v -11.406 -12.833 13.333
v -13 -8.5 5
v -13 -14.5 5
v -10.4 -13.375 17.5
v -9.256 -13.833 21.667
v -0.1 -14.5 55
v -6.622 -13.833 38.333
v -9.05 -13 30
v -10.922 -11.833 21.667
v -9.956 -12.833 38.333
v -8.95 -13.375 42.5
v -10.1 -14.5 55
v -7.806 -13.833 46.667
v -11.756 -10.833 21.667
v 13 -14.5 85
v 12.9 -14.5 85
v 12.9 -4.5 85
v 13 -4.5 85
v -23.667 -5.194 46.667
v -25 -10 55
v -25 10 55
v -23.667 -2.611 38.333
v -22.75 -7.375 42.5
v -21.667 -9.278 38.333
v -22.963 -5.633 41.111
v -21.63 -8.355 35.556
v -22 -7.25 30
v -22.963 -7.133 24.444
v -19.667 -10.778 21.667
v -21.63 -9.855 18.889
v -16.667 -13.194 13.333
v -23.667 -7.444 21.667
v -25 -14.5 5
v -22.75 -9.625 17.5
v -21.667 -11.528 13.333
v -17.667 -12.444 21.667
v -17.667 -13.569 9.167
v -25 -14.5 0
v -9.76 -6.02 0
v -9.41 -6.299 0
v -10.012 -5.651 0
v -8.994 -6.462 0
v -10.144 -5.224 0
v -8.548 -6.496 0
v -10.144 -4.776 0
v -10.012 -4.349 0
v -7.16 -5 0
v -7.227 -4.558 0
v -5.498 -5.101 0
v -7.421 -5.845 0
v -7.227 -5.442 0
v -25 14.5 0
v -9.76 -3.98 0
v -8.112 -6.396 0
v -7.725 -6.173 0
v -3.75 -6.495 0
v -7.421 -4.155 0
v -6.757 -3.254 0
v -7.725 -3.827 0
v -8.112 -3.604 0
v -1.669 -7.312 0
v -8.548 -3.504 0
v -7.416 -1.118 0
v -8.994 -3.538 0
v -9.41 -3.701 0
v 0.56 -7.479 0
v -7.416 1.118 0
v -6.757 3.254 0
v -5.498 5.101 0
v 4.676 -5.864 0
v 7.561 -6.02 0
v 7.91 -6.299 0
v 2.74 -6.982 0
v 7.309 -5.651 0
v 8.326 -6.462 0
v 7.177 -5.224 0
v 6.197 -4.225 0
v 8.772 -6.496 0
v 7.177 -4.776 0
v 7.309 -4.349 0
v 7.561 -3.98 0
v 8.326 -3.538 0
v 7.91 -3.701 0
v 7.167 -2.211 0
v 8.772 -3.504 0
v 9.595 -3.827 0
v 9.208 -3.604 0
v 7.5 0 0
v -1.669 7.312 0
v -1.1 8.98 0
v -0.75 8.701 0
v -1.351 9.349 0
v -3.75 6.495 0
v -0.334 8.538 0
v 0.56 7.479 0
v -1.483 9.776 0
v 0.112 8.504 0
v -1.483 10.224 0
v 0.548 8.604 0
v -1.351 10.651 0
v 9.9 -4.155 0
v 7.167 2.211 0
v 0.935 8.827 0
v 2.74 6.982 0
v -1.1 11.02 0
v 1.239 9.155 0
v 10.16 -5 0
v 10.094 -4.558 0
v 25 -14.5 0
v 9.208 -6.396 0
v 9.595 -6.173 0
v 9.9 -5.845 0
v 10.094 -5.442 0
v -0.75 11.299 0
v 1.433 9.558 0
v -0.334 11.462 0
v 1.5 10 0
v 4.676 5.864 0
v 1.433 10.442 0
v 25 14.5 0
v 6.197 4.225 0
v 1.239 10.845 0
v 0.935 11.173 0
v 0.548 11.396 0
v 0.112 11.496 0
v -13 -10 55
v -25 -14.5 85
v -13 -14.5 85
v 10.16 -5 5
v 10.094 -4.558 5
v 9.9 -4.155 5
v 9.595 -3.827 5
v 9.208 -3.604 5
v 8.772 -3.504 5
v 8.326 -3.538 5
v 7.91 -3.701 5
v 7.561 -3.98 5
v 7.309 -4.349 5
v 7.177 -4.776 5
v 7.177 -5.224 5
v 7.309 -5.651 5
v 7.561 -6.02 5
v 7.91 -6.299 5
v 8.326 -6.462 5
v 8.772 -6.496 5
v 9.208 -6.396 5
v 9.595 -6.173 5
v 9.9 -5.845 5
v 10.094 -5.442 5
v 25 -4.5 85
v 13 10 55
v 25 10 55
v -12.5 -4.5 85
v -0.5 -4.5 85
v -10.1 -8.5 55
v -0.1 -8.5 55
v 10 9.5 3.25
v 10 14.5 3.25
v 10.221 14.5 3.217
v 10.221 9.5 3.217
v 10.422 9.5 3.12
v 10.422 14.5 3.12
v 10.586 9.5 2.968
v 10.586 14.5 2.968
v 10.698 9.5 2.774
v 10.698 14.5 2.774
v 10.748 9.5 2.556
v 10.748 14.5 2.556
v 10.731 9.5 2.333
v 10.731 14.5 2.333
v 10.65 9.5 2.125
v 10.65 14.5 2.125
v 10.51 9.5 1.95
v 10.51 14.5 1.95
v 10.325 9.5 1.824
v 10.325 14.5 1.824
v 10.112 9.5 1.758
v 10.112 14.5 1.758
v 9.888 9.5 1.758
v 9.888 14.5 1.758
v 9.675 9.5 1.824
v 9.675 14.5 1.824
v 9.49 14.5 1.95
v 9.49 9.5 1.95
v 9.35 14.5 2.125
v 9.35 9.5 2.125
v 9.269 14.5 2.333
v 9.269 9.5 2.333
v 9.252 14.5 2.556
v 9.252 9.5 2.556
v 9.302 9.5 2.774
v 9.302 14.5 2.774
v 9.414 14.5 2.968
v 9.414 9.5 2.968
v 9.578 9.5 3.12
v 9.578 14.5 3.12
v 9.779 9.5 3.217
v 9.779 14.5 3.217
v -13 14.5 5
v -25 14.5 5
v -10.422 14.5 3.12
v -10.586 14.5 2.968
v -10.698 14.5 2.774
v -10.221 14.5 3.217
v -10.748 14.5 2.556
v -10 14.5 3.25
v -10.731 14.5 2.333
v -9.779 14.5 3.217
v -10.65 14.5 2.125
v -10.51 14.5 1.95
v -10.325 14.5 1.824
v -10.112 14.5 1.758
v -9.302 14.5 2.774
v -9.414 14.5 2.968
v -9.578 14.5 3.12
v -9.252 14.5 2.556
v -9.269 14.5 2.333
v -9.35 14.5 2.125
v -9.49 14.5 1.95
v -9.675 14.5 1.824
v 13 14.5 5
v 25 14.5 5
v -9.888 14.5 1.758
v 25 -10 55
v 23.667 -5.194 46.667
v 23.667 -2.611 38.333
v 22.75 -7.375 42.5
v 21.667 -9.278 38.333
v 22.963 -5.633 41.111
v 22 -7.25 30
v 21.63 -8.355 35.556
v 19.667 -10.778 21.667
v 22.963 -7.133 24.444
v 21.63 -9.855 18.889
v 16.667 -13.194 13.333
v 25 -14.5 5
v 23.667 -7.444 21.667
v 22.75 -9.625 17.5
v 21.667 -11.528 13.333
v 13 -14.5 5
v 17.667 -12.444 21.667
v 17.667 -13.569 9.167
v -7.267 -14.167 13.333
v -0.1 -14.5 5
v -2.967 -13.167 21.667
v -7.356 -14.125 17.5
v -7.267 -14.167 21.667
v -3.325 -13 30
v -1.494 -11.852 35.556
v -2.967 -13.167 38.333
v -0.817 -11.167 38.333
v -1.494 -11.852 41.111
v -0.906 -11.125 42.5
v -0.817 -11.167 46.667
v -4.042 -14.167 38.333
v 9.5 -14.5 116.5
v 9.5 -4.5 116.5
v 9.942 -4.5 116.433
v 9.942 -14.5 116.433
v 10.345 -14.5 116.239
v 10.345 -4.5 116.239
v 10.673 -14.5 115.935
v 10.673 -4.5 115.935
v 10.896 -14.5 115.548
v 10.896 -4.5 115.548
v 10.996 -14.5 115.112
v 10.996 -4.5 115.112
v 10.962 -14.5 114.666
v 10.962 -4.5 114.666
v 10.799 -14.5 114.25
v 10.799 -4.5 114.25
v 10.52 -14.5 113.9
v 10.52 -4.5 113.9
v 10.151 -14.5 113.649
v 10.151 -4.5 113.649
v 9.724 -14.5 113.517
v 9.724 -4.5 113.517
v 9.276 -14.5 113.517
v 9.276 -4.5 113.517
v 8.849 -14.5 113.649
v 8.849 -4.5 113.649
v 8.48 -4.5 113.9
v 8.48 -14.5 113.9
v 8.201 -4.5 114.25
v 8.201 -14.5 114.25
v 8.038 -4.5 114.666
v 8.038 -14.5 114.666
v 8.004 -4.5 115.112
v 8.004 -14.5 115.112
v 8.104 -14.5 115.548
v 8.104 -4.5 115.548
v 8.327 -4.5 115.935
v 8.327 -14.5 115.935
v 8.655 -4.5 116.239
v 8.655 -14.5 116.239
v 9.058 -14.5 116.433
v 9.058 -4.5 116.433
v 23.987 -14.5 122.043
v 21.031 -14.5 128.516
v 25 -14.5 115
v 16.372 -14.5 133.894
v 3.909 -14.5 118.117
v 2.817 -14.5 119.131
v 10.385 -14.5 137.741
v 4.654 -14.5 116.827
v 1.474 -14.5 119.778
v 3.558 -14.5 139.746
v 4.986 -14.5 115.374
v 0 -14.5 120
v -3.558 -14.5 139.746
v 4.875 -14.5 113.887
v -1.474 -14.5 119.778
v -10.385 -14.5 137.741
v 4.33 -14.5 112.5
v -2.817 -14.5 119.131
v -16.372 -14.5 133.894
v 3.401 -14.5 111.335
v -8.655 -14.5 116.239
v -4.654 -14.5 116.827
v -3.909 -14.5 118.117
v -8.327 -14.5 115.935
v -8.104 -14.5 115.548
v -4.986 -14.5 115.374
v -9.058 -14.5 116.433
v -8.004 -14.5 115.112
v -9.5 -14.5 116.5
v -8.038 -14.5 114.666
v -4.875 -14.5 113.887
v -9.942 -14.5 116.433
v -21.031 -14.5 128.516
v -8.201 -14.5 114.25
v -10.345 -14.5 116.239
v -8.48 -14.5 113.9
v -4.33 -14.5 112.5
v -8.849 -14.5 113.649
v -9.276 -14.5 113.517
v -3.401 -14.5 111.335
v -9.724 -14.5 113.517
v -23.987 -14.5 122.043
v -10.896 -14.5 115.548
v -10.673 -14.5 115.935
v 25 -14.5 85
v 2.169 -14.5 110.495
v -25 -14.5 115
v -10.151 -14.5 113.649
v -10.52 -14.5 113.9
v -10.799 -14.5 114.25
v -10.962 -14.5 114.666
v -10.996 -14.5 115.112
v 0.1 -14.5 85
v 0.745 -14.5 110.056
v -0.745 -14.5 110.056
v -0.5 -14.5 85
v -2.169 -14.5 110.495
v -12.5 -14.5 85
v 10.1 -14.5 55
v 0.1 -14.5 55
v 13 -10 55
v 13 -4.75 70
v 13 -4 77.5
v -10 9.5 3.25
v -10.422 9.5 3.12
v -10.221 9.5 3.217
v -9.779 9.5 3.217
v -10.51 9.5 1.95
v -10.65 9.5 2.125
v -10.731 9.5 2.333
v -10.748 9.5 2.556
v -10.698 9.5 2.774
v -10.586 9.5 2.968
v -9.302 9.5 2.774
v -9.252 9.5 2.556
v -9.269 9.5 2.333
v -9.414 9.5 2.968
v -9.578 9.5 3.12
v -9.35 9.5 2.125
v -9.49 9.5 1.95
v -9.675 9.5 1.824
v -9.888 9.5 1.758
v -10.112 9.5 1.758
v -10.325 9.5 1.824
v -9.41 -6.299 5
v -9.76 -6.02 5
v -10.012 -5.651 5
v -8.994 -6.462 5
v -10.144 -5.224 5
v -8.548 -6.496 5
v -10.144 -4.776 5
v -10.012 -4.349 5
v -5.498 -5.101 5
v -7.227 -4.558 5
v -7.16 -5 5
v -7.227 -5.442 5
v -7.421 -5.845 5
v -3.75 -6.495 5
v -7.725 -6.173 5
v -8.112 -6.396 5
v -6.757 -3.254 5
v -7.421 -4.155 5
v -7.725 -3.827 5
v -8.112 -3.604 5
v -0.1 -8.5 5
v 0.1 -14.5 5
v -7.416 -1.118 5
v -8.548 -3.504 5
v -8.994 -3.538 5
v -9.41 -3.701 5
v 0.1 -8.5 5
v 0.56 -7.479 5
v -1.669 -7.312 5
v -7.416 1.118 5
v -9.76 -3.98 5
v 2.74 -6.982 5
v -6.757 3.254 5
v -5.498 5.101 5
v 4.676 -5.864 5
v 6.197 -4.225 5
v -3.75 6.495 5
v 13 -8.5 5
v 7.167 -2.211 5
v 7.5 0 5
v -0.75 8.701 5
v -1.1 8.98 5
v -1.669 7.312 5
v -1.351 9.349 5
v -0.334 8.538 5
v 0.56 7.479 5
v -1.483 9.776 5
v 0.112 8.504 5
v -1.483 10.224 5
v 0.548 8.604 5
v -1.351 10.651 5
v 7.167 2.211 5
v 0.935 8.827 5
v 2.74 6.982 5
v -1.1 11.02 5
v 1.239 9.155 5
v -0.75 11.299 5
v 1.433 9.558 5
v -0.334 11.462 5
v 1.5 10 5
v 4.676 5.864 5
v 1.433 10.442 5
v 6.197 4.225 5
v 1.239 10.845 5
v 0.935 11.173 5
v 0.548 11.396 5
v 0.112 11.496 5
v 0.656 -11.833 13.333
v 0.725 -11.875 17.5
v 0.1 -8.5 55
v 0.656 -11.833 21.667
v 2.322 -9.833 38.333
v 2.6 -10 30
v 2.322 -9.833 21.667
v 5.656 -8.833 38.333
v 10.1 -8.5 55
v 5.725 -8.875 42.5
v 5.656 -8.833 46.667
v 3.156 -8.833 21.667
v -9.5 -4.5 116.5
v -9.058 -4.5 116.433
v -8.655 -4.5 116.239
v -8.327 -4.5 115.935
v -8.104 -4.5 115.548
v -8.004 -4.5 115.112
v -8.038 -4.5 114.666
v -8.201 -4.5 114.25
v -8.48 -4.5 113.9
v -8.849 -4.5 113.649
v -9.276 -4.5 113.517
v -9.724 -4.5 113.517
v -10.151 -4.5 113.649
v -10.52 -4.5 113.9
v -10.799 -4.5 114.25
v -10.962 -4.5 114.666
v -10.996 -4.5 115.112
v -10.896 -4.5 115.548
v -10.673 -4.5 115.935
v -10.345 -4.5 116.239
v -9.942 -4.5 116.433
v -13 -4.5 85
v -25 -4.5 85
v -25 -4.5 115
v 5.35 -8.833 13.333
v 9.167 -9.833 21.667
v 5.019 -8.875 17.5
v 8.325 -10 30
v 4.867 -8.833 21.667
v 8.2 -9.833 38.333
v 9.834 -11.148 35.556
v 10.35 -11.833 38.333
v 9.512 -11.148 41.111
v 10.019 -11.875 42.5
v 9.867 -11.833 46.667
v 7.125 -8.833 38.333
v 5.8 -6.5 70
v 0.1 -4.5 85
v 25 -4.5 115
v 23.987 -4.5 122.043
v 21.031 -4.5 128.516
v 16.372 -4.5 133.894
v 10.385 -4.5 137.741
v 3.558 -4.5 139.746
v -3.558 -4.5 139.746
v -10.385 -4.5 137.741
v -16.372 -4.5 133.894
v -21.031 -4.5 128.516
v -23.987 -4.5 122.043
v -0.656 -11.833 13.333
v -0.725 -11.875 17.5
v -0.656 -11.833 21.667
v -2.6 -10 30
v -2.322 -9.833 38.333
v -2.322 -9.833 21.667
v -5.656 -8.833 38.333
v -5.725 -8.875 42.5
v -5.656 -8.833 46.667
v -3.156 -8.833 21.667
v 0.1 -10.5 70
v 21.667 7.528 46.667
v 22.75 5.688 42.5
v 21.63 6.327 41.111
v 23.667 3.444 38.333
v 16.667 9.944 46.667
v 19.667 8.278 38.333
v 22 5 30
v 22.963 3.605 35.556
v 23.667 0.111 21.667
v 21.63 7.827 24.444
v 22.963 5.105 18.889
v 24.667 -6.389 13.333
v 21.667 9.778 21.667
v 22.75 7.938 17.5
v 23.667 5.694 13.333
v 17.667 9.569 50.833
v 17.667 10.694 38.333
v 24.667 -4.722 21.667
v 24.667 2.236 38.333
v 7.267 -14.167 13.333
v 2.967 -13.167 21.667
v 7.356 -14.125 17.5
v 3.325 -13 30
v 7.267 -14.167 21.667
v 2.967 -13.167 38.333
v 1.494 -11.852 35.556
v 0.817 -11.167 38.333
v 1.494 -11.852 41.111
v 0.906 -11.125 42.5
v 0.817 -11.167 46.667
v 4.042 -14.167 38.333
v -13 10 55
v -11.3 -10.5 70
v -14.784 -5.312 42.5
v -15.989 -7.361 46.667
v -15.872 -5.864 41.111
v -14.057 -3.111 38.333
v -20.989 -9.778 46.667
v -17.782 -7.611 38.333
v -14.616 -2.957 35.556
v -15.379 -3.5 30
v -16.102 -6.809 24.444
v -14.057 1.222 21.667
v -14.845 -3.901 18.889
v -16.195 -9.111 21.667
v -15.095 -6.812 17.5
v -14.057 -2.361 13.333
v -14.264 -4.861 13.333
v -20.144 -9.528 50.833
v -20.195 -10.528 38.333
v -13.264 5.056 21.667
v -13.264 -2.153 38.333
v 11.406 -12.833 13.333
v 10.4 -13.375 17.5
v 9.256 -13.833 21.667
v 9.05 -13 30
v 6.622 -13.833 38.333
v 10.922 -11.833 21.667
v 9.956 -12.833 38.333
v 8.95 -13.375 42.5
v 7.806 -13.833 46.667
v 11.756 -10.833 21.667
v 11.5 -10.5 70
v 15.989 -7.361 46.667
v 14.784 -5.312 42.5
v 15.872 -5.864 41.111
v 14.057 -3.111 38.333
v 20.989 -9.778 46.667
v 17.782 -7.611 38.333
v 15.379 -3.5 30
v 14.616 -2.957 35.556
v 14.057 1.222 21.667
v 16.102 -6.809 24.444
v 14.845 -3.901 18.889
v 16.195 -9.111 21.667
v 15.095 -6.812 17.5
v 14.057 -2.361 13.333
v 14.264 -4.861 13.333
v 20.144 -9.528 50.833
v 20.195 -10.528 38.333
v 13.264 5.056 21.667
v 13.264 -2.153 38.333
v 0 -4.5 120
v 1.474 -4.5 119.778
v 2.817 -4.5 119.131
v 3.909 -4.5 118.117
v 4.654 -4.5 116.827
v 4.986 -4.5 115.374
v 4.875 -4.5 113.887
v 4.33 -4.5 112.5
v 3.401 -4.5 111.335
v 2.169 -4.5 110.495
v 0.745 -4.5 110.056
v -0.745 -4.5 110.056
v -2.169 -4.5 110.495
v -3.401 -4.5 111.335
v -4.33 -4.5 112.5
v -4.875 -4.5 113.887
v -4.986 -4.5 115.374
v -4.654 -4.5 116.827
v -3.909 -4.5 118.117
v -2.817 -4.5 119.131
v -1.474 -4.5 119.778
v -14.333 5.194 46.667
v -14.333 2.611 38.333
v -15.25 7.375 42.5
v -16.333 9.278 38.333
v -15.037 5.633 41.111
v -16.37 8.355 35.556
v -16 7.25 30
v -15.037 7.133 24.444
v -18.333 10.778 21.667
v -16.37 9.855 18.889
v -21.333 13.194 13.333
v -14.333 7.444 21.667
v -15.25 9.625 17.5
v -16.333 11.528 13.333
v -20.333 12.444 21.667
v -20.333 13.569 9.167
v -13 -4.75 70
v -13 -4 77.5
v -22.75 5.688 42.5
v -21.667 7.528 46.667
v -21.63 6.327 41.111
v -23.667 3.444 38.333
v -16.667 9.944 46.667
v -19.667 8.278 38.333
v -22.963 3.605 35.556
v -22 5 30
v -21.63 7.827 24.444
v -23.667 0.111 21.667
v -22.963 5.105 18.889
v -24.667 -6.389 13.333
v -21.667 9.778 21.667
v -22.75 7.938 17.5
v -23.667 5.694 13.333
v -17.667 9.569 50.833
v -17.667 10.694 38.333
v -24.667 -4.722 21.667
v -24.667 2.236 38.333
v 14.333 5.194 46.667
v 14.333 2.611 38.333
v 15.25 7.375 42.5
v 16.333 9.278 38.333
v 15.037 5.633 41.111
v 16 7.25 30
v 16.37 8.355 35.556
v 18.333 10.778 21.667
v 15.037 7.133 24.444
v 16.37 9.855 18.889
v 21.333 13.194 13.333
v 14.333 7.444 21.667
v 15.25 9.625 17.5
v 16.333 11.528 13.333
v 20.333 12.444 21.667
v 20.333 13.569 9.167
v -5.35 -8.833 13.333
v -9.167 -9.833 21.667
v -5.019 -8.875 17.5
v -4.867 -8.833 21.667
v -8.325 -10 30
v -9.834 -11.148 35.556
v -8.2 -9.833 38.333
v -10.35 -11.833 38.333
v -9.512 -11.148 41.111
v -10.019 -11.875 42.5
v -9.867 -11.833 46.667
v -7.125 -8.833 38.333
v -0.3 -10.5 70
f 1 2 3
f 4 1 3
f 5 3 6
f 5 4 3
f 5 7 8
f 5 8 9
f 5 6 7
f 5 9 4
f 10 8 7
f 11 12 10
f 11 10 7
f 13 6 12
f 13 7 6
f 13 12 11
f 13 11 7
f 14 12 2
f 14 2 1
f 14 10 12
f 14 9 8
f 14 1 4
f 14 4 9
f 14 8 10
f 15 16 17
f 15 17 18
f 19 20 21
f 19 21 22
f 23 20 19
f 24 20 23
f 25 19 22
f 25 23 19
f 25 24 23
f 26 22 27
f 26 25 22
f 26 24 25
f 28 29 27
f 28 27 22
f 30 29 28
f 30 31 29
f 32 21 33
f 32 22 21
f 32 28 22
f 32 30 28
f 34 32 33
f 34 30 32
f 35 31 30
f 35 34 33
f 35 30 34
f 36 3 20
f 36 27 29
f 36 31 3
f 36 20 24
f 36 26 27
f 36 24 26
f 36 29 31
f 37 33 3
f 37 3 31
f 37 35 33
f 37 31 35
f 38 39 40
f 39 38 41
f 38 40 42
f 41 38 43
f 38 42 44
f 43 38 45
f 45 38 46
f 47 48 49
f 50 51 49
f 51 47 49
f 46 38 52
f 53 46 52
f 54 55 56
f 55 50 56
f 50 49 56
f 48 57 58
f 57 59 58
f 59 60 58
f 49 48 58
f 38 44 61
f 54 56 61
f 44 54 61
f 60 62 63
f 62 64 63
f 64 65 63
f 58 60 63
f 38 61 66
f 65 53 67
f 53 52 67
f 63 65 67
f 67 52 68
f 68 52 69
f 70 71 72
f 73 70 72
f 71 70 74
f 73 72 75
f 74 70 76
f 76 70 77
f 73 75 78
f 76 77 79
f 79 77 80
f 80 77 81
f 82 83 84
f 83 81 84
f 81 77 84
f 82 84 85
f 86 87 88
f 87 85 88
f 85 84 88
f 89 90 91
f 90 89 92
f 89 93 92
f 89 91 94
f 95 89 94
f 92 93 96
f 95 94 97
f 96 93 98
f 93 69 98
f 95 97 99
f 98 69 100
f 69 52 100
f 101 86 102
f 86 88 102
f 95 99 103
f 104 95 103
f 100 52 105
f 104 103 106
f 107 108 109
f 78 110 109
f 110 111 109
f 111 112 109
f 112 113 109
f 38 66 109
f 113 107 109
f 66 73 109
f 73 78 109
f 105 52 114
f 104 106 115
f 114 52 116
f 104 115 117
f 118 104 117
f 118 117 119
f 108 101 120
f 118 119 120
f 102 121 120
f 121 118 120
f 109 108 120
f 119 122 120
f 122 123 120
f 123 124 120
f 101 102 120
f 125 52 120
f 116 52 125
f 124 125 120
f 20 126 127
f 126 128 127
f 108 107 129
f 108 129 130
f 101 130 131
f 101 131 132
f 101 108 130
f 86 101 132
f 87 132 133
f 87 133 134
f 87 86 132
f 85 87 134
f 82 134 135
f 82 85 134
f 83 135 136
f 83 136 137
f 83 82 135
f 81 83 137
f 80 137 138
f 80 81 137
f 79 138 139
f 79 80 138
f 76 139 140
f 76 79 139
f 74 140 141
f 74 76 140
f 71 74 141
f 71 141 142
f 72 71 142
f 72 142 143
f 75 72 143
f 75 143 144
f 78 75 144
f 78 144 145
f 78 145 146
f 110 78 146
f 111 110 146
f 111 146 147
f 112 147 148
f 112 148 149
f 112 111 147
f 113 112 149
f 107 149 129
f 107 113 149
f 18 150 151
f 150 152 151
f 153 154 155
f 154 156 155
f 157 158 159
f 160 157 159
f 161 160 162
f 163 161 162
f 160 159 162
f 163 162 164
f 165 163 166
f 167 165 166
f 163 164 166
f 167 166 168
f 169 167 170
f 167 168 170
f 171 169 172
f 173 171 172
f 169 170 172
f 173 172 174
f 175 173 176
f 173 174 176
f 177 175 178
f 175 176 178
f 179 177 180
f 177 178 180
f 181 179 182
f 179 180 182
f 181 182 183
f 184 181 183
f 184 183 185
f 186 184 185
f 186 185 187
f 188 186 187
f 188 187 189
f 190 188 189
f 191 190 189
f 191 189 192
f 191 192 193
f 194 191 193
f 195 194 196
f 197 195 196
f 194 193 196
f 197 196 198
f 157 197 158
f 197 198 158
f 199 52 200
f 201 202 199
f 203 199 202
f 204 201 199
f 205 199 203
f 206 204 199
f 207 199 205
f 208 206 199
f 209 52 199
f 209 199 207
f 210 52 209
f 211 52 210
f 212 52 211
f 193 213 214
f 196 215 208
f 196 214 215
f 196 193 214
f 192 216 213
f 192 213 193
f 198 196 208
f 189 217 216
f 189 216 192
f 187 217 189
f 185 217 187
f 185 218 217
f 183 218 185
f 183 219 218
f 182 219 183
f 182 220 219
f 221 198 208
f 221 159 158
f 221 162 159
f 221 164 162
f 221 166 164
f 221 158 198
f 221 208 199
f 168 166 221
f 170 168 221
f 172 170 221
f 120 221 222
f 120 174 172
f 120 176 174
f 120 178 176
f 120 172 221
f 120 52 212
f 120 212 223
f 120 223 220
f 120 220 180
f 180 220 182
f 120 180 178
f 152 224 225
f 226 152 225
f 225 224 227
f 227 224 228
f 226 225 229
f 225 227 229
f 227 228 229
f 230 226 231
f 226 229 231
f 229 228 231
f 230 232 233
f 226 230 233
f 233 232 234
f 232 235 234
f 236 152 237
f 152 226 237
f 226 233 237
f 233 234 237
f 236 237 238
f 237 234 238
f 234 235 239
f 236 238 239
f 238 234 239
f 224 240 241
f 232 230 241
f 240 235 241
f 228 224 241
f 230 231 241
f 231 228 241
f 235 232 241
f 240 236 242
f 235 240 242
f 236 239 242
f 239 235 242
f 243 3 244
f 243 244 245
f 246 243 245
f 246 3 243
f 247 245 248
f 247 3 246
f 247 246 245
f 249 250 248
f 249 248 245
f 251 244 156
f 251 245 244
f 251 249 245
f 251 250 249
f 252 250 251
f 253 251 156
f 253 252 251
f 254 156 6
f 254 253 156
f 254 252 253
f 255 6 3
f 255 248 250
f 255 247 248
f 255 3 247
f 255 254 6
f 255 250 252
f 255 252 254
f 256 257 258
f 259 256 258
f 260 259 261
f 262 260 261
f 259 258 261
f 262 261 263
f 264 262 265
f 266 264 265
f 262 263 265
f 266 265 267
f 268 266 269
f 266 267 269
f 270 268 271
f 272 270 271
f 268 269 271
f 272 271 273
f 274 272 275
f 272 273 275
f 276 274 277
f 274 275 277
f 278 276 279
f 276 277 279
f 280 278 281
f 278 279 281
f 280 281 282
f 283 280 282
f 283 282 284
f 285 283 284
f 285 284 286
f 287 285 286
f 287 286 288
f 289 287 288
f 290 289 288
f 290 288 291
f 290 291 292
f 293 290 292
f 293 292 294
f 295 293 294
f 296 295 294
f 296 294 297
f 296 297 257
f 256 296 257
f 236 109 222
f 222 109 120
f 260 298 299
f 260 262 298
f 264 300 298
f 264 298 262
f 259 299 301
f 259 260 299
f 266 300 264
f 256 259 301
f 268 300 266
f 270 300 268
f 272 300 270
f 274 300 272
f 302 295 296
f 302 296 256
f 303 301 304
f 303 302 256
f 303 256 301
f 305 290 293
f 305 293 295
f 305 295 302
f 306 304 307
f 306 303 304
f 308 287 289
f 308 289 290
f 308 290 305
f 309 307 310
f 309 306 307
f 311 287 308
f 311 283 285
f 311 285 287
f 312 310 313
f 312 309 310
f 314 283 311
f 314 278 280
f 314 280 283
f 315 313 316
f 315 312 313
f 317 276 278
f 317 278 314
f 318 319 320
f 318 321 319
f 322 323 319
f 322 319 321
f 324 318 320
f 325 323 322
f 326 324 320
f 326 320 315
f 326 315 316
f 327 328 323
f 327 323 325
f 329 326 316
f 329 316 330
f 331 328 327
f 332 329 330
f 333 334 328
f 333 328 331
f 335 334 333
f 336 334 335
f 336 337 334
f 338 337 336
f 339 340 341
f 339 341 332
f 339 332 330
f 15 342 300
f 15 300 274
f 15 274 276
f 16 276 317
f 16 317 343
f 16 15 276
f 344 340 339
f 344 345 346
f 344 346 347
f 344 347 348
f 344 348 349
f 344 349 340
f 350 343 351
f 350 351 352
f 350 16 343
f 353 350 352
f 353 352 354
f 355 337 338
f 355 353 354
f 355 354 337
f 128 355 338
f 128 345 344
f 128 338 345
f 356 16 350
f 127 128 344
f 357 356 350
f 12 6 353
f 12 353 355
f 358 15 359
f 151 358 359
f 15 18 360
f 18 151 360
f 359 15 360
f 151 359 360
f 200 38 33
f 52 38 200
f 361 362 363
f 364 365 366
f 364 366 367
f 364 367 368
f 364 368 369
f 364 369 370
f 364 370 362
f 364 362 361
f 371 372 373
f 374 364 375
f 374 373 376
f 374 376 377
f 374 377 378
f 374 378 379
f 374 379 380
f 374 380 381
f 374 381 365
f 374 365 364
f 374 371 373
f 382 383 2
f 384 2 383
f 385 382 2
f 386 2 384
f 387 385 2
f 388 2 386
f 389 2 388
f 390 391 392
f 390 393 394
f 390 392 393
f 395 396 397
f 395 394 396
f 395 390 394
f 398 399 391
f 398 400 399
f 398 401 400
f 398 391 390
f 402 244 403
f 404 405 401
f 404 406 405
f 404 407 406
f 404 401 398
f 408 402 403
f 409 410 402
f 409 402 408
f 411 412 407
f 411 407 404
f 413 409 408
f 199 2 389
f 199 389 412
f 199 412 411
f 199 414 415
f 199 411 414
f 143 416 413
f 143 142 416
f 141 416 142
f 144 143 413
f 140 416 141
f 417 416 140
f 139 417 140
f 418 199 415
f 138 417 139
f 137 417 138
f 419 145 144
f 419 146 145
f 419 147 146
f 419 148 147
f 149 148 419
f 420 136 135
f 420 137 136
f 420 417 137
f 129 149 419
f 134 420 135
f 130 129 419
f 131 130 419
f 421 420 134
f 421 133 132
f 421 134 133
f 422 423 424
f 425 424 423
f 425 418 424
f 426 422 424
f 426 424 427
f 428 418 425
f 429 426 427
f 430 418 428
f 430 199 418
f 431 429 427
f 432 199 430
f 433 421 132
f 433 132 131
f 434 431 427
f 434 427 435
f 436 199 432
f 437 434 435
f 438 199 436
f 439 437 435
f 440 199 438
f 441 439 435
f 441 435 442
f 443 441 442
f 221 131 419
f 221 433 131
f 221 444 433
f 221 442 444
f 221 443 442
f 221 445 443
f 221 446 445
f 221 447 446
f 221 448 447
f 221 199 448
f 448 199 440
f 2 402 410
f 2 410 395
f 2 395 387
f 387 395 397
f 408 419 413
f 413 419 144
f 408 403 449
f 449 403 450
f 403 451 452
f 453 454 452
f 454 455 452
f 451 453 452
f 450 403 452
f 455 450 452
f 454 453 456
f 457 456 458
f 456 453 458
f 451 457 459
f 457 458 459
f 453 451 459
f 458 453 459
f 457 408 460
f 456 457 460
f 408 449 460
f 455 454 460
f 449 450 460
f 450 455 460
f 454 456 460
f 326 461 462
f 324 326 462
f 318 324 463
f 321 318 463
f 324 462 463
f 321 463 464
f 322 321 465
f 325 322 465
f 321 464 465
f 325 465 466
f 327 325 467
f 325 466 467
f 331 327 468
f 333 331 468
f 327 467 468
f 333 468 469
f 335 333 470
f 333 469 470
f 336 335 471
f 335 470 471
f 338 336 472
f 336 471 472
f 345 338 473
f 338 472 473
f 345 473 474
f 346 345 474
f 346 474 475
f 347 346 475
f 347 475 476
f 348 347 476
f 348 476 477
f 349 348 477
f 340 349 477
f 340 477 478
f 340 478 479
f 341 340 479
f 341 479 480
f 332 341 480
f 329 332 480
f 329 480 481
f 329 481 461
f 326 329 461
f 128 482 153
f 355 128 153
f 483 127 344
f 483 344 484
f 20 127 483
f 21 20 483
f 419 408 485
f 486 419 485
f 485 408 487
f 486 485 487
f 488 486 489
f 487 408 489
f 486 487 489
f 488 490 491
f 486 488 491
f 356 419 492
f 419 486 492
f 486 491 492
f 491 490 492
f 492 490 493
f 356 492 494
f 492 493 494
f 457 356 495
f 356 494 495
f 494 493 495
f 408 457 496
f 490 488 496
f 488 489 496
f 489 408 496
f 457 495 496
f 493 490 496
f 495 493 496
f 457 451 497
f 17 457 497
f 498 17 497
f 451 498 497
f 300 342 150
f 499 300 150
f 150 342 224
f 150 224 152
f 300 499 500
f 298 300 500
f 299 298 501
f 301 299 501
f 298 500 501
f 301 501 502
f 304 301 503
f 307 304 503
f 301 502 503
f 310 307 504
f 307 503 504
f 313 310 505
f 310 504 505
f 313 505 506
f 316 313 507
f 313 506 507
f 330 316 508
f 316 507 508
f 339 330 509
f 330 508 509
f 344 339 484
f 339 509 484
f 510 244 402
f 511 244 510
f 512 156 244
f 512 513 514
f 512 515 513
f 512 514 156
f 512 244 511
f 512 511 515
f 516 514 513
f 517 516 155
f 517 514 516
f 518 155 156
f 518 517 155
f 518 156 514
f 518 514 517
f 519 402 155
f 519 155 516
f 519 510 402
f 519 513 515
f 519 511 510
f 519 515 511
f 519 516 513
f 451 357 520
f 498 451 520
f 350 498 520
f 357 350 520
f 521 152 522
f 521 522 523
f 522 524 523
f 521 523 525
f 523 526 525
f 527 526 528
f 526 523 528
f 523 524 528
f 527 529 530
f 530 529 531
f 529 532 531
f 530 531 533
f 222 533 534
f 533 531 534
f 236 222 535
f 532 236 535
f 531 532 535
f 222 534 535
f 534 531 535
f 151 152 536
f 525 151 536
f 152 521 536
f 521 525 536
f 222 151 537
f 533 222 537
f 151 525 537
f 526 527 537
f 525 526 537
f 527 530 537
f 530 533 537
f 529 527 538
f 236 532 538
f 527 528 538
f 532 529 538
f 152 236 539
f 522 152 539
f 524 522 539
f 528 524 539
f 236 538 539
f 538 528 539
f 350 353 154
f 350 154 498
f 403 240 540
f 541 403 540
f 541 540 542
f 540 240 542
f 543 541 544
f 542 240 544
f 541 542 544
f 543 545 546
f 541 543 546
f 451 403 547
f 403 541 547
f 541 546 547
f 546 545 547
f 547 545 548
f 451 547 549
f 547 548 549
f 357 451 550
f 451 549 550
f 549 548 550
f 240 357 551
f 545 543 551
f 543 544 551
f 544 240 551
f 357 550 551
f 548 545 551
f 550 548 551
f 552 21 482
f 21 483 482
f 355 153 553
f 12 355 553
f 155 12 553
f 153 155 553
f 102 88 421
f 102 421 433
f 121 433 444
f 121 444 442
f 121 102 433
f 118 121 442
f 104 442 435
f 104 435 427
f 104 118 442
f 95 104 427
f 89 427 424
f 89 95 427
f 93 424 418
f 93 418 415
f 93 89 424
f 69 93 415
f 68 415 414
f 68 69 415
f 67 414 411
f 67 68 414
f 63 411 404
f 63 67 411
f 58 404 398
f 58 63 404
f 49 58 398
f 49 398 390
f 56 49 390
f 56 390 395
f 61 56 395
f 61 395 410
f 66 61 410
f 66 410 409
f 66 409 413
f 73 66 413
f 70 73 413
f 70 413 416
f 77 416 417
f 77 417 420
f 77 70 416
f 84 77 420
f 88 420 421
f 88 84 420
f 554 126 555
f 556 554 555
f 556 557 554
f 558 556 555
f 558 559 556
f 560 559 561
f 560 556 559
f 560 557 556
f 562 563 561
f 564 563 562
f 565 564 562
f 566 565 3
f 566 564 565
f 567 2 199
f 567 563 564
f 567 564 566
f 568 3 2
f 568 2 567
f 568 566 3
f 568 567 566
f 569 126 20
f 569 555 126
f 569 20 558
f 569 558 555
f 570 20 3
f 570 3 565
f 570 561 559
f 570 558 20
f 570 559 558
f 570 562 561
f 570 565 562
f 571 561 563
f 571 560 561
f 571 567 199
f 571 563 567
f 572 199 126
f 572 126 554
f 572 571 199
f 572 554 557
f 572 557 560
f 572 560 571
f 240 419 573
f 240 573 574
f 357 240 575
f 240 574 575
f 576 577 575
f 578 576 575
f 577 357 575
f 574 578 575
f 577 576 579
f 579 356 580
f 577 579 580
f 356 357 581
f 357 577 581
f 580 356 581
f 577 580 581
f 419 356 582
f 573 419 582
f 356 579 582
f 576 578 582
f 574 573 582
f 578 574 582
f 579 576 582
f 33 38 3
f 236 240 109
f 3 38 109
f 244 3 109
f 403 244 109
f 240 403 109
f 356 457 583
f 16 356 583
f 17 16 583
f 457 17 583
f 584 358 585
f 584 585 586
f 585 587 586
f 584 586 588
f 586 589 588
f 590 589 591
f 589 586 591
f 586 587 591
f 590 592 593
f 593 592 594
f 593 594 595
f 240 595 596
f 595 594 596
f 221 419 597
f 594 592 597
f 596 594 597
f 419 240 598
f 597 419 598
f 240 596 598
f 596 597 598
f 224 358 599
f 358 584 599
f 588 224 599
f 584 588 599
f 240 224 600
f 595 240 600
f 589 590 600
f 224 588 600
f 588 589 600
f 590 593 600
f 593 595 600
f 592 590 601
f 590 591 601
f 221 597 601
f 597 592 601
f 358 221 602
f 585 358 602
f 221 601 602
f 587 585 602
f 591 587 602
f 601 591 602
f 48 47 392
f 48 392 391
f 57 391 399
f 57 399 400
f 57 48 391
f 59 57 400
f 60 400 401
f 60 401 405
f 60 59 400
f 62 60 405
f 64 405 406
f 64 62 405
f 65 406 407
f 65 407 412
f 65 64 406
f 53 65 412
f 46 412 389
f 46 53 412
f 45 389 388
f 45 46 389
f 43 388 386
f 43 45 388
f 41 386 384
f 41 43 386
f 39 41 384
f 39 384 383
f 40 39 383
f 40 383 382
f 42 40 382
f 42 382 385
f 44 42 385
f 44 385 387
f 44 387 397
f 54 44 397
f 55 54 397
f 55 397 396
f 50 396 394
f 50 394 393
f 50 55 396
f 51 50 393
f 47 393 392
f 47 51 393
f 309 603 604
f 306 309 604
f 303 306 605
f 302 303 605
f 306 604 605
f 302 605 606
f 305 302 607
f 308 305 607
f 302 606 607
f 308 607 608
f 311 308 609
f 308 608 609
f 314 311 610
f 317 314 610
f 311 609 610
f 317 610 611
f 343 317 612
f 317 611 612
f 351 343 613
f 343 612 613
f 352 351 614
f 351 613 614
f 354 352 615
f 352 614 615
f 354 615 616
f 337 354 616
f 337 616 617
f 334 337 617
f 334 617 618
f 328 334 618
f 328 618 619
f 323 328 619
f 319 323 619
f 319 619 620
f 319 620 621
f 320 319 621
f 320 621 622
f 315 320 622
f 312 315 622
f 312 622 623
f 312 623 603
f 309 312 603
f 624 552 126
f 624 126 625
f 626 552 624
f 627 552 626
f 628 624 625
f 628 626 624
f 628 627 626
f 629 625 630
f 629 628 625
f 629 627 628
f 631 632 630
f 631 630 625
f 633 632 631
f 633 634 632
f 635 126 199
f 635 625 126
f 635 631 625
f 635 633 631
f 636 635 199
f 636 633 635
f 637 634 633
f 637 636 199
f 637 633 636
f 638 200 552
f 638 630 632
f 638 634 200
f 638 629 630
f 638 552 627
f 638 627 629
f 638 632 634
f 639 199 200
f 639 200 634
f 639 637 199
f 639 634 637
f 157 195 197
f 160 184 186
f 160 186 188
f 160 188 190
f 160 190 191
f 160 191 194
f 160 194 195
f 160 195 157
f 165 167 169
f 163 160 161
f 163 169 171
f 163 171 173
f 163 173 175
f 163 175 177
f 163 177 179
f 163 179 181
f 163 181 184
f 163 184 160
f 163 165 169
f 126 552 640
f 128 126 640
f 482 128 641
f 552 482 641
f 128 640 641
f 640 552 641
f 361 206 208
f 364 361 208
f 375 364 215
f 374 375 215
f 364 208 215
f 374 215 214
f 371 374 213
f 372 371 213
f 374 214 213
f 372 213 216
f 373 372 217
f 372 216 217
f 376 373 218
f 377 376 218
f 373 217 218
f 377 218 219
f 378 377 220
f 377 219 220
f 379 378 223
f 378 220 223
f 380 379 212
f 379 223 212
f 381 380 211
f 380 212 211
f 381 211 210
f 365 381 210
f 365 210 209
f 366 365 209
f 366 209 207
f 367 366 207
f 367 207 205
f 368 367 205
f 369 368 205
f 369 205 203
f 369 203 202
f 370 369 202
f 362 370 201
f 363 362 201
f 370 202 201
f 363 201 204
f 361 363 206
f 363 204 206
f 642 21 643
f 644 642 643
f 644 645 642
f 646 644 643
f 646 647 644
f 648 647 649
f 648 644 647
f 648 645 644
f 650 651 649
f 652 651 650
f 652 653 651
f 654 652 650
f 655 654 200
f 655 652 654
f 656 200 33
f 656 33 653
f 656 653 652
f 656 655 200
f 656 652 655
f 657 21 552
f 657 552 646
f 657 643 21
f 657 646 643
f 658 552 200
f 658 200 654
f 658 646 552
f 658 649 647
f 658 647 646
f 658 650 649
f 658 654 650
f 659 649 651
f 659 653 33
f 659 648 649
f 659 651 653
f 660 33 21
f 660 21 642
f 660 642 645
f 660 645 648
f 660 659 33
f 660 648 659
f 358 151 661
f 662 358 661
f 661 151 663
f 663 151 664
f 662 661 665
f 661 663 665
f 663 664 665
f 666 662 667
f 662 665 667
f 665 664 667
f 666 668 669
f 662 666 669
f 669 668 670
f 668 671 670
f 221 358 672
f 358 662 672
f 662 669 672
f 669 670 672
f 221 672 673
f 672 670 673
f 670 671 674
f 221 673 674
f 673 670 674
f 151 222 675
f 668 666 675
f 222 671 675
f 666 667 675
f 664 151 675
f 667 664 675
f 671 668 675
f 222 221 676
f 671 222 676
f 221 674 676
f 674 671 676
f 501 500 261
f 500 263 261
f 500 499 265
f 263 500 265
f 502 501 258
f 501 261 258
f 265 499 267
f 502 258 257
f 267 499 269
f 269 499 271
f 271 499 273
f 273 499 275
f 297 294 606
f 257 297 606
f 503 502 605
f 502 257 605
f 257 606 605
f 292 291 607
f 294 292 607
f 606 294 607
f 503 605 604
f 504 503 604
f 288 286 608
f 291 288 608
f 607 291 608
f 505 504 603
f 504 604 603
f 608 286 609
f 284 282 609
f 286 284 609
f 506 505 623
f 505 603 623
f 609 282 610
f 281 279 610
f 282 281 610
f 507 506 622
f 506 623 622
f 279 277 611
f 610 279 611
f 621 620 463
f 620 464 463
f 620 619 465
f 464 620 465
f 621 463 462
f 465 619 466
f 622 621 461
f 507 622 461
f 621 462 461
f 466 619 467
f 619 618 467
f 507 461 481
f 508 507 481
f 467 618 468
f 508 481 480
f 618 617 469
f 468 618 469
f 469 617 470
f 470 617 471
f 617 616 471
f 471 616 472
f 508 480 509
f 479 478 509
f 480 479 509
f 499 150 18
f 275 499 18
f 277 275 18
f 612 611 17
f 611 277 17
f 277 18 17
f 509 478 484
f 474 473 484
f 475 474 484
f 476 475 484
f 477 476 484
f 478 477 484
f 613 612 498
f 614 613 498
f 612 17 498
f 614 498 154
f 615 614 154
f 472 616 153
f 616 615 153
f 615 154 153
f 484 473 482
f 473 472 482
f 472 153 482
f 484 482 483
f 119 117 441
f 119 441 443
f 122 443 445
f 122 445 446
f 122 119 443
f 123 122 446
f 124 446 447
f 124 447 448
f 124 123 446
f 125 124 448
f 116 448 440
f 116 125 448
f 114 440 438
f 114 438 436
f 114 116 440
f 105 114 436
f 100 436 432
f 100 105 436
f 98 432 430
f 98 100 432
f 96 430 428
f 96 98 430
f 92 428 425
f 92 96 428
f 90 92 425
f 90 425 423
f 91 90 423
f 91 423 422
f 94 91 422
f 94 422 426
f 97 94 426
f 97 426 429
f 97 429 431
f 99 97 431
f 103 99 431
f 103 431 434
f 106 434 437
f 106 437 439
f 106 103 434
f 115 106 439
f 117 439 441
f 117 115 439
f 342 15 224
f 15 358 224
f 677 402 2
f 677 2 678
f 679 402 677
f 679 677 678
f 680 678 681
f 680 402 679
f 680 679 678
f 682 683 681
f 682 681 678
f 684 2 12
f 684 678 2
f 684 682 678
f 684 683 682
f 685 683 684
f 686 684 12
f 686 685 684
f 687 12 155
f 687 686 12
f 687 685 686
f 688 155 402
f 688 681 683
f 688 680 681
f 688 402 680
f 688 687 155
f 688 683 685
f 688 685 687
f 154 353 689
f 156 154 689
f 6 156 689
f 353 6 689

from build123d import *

# Parameters (mm, degrees)
SKETCH_1_W          = 50
SKETCH_1_H          = 29
SKETCH_1_R          = 1.5
SKETCH_1_R_2        = 7.5
EXTRUDE_1_DEPTH     = 5
SKETCH_22_W         = 50
SKETCH_22_H         = 10
EXTRUDE_2_DEPTH     = 30
EXTRUDE_3_DEPTH     = 10
SKETCH_25_R         = 5
SKETCH_25_R_2       = 1.5
CUT_EXTRUDE_1_DEPTH = 144.478221472
SKETCH_26_R         = 0.75
CUT_EXTRUDE_2_DEPTH = 5


with BuildPart() as part:
    # 草圖1 → 填料-伸長1 (new body)
    with BuildSketch(Plane.XY):
        Rectangle(SKETCH_1_W, SKETCH_1_H)
        with Locations((0, 10)):
            Circle(SKETCH_1_R, mode=Mode.SUBTRACT)
        with Locations((-8.660254038, -5)):
            Circle(SKETCH_1_R, mode=Mode.SUBTRACT)
        with Locations((8.660254038, -5)):
            Circle(SKETCH_1_R, mode=Mode.SUBTRACT)
        Circle(SKETCH_1_R_2, mode=Mode.SUBTRACT)
    extrude(amount=EXTRUDE_1_DEPTH)

    # 疊層拉伸2: read off the stored shape, not the designer's step
    # 疊層拉伸2: loft between two sections, ruled curve by curve
    loft_2_from = [
        Edge.make_bspline([(-13, 10, 55), (-13, 6.666666667, 55), (-13, 3.333333333, 55), (-13, -3.333333333, 55), (-13, -6.666666667, 55), (-13, -10, 55)], [0, 0, 0, 0, 0.5, 0.5, 1, 1, 1, 1], 3),
        Edge.make_bspline([(-13, -10, 55), (-15, -10, 55), (-17, -10, 55), (-21, -10, 55), (-23, -10, 55), (-25, -10, 55)], [0, 0, 0, 0, 0.5, 0.5, 1, 1, 1, 1], 3),
        Edge.make_bspline([(-25, 10, 55), (-23, 10, 55), (-21, 10, 55), (-17, 10, 55), (-15, 10, 55), (-13, 10, 55)], [0, 0, 0, 0, 0.5, 0.5, 1, 1, 1, 1], 3),
        Edge.make_bspline([(-25, -10, 55), (-25, -6.666666667, 55), (-25, -3.333333333, 55), (-25, 3.333333333, 55), (-25, 6.666666667, 55), (-25, 10, 55)], [0, 0, 0, 0, 0.5, 0.5, 1, 1, 1, 1], 3),
    ]
    loft_2_to = [
        Edge.make_bspline([(-25, 14.5, 5), (-23, 14.5, 5), (-21, 14.5, 5), (-17, 14.5, 5), (-15, 14.5, 5), (-13, 14.5, 5)], [0, 0, 0, 0, 0.5, 0.5, 1, 1, 1, 1], 3),
        Edge.make_bspline([(-13, 14.5, 5), (-13, 9.666666667, 5), (-13, 4.833333333, 5), (-13, -4.833333333, 5), (-13, -9.666666667, 5), (-13, -14.5, 5)], [0, 0, 0, 0, 0.5, 0.5, 1, 1, 1, 1], 3),
        Edge.make_bspline([(-25, -14.5, 5), (-25, -9.666666667, 5), (-25, -4.833333333, 5), (-25, 4.833333333, 5), (-25, 9.666666667, 5), (-25, 14.5, 5)], [0, 0, 0, 0, 0.5, 0.5, 1, 1, 1, 1], 3),
        Edge.make_bspline([(-13, -14.5, 5), (-15, -14.5, 5), (-17, -14.5, 5), (-21, -14.5, 5), (-23, -14.5, 5), (-25, -14.5, 5)], [0, 0, 0, 0, 0.5, 0.5, 1, 1, 1, 1], 3),
    ]
    loft_2 = Solid(Shell([*[Face.make_surface_from_curves(loft_2_from[k], loft_2_to[k]) for k in range(4)], Face(Wire(loft_2_from)), Face(Wire(loft_2_to))]))
    add(loft_2)

    # 疊層拉伸7: read off the stored shape, not the designer's step
    # 疊層拉伸7: loft between two sections, ruled curve by curve
    loft_7_from = [
        Edge.make_bspline([(-0.1, -8.5, 5), (-2.25, -8.5, 5), (-4.4, -8.5, 5), (-8.7, -8.5, 5), (-10.85, -8.5, 5), (-13, -8.5, 5)], [0, 0, 0, 0, 0.5, 0.5, 1, 1, 1, 1], 3),
        Edge.make_bspline([(-13, -8.5, 5), (-13, -9.5, 5), (-13, -10.5, 5), (-13, -12.5, 5), (-13, -13.5, 5), (-13, -14.5, 5)], [0, 0, 0, 0, 0.5, 0.5, 1, 1, 1, 1], 3),
        Edge.make_bspline([(-0.1, -14.5, 5), (-0.1, -13.5, 5), (-0.1, -12.5, 5), (-0.1, -10.5, 5), (-0.1, -9.5, 5), (-0.1, -8.5, 5)], [0, 0, 0, 0, 0.5, 0.5, 1, 1, 1, 1], 3),
        Edge.make_bspline([(-13, -14.5, 5), (-10.85, -14.5, 5), (-8.7, -14.5, 5), (-4.4, -14.5, 5), (-2.25, -14.5, 5), (-0.1, -14.5, 5)], [0, 0, 0, 0, 0.5, 0.5, 1, 1, 1, 1], 3),
    ]
    loft_7_to = [
        Edge.make_bspline([(-10.1, -8.5, 55), (-10.1, -9.5, 55), (-10.1, -10.5, 55), (-10.1, -12.5, 55), (-10.1, -13.5, 55), (-10.1, -14.5, 55)], [0, 0, 0, 0, 0.5, 0.5, 1, 1, 1, 1], 3),
        Edge.make_bspline([(-10.1, -14.5, 55), (-8.433333333, -14.5, 55), (-6.766666667, -14.5, 55), (-3.433333333, -14.5, 55), (-1.766666667, -14.5, 55), (-0.1, -14.5, 55)], [0, 0, 0, 0, 0.5, 0.5, 1, 1, 1, 1], 3),
        Edge.make_bspline([(-0.1, -8.5, 55), (-1.766666667, -8.5, 55), (-3.433333333, -8.5, 55), (-6.766666667, -8.5, 55), (-8.433333333, -8.5, 55), (-10.1, -8.5, 55)], [0, 0, 0, 0, 0.5, 0.5, 1, 1, 1, 1], 3),
        Edge.make_bspline([(-0.1, -14.5, 55), (-0.1, -13.5, 55), (-0.1, -12.5, 55), (-0.1, -10.5, 55), (-0.1, -9.5, 55), (-0.1, -8.5, 55)], [0, 0, 0, 0, 0.5, 0.5, 1, 1, 1, 1], 3),
    ]
    loft_7 = Solid(Shell([*[Face.make_surface_from_curves(loft_7_from[k], loft_7_to[k]) for k in range(4)], Face(Wire(loft_7_from)), Face(Wire(loft_7_to))]))
    add(loft_7)

    # 草圖17 → section 1 of loft_13
    with BuildSketch(Plane.XY.offset(85), mode=Mode.PRIVATE) as loft_13_s1:
        with BuildLine():
            Line((-25, -14.5), (-13, -14.5))
            Line((-13, -14.5), (-13, -4.5))
            Line((-13, -4.5), (-25, -4.5))
            Line((-25, -4.5), (-25, -14.5))
        make_face()
    # loft from a face of the part (loft_13)
    loft([part.faces().sort_by_distance((-19, 0, 55))[0], loft_13_s1.sketch])

    # 草圖19 → section 0 of loft_14
    with BuildSketch(Plane.XY.offset(85), mode=Mode.PRIVATE) as loft_14_s0:
        with BuildLine():
            Line((-12.5, -14.5), (-0.5, -14.5))
            Line((-0.5, -14.5), (-0.5, -4.5))
            Line((-0.5, -4.5), (-12.5, -4.5))
            Line((-12.5, -4.5), (-12.5, -14.5))
        make_face()
    # loft up to a face of the part (loft_14)
    loft([loft_14_s0.sketch, part.faces().sort_by_distance((-5.1, -11.5, 55))[0]])

    # 鏡射5: 疊層拉伸2, 疊層拉伸7 across plane
    add(loft_2.mirror(Plane.ZY))
    add(loft_7.mirror(Plane.ZY))

    # 草圖20 → section 0 of loft_15
    with BuildSketch(Plane.XY.offset(85), mode=Mode.PRIVATE) as loft_15_s0:
        with BuildLine():
            Line((25, -4.5), (13, -4.5))
            Line((13, -4.5), (13, -14.5))
            Line((13, -14.5), (25, -14.5))
            Line((25, -14.5), (25, -4.5))
        make_face()
    # loft up to a face of the part (loft_15)
    loft([loft_15_s0.sketch, part.faces().sort_by_distance((19, 0, 55))[0]])

    # 草圖21 → section 1 of loft_16
    with BuildSketch(Plane.XY.offset(85), mode=Mode.PRIVATE) as loft_16_s1:
        with BuildLine():
            Line((0.1, -14.5), (12.9, -14.5))
            Line((12.9, -14.5), (12.9, -4.5))
            Line((12.9, -4.5), (0.1, -4.5))
            Line((0.1, -4.5), (0.1, -14.5))
        make_face()
    # loft from a face of the part (loft_16)
    loft([part.faces().sort_by_distance((5.1, -11.5, 55))[0], loft_16_s1.sketch])

    # 草圖22 → 填料-伸長2 (add)
    with BuildSketch(Plane.XY.offset(85)):
        with Locations((0, -9.5)):
            Rectangle(SKETCH_22_W, SKETCH_22_H)
    extrude(amount=EXTRUDE_2_DEPTH)

    # 草圖23 → 填料-伸長3 (add)
    with BuildSketch(Plane(origin=(0, -4.5, 0), x_dir=(1, 0, 0), z_dir=(0, 1, 0))):
        with BuildLine():
            Line((-25, -115), (25, -115))
            ThreePointArc((25, -115), (0, -140), (-25, -115))
        make_face()
    extrude(amount=-EXTRUDE_3_DEPTH)

    # 草圖25 → 除料-伸長1 (cut, through all)
    with BuildSketch(Plane(origin=(0, -4.5, 0), x_dir=(1, 0, 0), z_dir=(0, 1, 0))):
        with Locations(Location((0, -115, 0), (0, 0, 270))):
            Circle(SKETCH_25_R)
        with Locations(Location((9.5, -115, 0), (0, 0, 270))):
            Circle(SKETCH_25_R_2)
        with Locations(Location((-9.5, -115, 0), (0, 0, 270))):
            Circle(SKETCH_25_R_2)
    extrude(amount=-CUT_EXTRUDE_1_DEPTH, mode=Mode.SUBTRACT)

    # 草圖26 → 除料-伸長2 (cut)
    with BuildSketch(Plane(origin=(0, 14.5, 0), x_dir=(1, 0, 0), z_dir=(0, 1, 0))):
        with Locations(Location((-10, -2.5, 0), (0, 0, 270))):
            Circle(SKETCH_26_R)
        with Locations(Location((10, -2.5, 0), (0, 0, 270))):
            Circle(SKETCH_26_R)
    extrude(amount=-CUT_EXTRUDE_2_DEPTH, mode=Mode.SUBTRACT)


solid = part.part
